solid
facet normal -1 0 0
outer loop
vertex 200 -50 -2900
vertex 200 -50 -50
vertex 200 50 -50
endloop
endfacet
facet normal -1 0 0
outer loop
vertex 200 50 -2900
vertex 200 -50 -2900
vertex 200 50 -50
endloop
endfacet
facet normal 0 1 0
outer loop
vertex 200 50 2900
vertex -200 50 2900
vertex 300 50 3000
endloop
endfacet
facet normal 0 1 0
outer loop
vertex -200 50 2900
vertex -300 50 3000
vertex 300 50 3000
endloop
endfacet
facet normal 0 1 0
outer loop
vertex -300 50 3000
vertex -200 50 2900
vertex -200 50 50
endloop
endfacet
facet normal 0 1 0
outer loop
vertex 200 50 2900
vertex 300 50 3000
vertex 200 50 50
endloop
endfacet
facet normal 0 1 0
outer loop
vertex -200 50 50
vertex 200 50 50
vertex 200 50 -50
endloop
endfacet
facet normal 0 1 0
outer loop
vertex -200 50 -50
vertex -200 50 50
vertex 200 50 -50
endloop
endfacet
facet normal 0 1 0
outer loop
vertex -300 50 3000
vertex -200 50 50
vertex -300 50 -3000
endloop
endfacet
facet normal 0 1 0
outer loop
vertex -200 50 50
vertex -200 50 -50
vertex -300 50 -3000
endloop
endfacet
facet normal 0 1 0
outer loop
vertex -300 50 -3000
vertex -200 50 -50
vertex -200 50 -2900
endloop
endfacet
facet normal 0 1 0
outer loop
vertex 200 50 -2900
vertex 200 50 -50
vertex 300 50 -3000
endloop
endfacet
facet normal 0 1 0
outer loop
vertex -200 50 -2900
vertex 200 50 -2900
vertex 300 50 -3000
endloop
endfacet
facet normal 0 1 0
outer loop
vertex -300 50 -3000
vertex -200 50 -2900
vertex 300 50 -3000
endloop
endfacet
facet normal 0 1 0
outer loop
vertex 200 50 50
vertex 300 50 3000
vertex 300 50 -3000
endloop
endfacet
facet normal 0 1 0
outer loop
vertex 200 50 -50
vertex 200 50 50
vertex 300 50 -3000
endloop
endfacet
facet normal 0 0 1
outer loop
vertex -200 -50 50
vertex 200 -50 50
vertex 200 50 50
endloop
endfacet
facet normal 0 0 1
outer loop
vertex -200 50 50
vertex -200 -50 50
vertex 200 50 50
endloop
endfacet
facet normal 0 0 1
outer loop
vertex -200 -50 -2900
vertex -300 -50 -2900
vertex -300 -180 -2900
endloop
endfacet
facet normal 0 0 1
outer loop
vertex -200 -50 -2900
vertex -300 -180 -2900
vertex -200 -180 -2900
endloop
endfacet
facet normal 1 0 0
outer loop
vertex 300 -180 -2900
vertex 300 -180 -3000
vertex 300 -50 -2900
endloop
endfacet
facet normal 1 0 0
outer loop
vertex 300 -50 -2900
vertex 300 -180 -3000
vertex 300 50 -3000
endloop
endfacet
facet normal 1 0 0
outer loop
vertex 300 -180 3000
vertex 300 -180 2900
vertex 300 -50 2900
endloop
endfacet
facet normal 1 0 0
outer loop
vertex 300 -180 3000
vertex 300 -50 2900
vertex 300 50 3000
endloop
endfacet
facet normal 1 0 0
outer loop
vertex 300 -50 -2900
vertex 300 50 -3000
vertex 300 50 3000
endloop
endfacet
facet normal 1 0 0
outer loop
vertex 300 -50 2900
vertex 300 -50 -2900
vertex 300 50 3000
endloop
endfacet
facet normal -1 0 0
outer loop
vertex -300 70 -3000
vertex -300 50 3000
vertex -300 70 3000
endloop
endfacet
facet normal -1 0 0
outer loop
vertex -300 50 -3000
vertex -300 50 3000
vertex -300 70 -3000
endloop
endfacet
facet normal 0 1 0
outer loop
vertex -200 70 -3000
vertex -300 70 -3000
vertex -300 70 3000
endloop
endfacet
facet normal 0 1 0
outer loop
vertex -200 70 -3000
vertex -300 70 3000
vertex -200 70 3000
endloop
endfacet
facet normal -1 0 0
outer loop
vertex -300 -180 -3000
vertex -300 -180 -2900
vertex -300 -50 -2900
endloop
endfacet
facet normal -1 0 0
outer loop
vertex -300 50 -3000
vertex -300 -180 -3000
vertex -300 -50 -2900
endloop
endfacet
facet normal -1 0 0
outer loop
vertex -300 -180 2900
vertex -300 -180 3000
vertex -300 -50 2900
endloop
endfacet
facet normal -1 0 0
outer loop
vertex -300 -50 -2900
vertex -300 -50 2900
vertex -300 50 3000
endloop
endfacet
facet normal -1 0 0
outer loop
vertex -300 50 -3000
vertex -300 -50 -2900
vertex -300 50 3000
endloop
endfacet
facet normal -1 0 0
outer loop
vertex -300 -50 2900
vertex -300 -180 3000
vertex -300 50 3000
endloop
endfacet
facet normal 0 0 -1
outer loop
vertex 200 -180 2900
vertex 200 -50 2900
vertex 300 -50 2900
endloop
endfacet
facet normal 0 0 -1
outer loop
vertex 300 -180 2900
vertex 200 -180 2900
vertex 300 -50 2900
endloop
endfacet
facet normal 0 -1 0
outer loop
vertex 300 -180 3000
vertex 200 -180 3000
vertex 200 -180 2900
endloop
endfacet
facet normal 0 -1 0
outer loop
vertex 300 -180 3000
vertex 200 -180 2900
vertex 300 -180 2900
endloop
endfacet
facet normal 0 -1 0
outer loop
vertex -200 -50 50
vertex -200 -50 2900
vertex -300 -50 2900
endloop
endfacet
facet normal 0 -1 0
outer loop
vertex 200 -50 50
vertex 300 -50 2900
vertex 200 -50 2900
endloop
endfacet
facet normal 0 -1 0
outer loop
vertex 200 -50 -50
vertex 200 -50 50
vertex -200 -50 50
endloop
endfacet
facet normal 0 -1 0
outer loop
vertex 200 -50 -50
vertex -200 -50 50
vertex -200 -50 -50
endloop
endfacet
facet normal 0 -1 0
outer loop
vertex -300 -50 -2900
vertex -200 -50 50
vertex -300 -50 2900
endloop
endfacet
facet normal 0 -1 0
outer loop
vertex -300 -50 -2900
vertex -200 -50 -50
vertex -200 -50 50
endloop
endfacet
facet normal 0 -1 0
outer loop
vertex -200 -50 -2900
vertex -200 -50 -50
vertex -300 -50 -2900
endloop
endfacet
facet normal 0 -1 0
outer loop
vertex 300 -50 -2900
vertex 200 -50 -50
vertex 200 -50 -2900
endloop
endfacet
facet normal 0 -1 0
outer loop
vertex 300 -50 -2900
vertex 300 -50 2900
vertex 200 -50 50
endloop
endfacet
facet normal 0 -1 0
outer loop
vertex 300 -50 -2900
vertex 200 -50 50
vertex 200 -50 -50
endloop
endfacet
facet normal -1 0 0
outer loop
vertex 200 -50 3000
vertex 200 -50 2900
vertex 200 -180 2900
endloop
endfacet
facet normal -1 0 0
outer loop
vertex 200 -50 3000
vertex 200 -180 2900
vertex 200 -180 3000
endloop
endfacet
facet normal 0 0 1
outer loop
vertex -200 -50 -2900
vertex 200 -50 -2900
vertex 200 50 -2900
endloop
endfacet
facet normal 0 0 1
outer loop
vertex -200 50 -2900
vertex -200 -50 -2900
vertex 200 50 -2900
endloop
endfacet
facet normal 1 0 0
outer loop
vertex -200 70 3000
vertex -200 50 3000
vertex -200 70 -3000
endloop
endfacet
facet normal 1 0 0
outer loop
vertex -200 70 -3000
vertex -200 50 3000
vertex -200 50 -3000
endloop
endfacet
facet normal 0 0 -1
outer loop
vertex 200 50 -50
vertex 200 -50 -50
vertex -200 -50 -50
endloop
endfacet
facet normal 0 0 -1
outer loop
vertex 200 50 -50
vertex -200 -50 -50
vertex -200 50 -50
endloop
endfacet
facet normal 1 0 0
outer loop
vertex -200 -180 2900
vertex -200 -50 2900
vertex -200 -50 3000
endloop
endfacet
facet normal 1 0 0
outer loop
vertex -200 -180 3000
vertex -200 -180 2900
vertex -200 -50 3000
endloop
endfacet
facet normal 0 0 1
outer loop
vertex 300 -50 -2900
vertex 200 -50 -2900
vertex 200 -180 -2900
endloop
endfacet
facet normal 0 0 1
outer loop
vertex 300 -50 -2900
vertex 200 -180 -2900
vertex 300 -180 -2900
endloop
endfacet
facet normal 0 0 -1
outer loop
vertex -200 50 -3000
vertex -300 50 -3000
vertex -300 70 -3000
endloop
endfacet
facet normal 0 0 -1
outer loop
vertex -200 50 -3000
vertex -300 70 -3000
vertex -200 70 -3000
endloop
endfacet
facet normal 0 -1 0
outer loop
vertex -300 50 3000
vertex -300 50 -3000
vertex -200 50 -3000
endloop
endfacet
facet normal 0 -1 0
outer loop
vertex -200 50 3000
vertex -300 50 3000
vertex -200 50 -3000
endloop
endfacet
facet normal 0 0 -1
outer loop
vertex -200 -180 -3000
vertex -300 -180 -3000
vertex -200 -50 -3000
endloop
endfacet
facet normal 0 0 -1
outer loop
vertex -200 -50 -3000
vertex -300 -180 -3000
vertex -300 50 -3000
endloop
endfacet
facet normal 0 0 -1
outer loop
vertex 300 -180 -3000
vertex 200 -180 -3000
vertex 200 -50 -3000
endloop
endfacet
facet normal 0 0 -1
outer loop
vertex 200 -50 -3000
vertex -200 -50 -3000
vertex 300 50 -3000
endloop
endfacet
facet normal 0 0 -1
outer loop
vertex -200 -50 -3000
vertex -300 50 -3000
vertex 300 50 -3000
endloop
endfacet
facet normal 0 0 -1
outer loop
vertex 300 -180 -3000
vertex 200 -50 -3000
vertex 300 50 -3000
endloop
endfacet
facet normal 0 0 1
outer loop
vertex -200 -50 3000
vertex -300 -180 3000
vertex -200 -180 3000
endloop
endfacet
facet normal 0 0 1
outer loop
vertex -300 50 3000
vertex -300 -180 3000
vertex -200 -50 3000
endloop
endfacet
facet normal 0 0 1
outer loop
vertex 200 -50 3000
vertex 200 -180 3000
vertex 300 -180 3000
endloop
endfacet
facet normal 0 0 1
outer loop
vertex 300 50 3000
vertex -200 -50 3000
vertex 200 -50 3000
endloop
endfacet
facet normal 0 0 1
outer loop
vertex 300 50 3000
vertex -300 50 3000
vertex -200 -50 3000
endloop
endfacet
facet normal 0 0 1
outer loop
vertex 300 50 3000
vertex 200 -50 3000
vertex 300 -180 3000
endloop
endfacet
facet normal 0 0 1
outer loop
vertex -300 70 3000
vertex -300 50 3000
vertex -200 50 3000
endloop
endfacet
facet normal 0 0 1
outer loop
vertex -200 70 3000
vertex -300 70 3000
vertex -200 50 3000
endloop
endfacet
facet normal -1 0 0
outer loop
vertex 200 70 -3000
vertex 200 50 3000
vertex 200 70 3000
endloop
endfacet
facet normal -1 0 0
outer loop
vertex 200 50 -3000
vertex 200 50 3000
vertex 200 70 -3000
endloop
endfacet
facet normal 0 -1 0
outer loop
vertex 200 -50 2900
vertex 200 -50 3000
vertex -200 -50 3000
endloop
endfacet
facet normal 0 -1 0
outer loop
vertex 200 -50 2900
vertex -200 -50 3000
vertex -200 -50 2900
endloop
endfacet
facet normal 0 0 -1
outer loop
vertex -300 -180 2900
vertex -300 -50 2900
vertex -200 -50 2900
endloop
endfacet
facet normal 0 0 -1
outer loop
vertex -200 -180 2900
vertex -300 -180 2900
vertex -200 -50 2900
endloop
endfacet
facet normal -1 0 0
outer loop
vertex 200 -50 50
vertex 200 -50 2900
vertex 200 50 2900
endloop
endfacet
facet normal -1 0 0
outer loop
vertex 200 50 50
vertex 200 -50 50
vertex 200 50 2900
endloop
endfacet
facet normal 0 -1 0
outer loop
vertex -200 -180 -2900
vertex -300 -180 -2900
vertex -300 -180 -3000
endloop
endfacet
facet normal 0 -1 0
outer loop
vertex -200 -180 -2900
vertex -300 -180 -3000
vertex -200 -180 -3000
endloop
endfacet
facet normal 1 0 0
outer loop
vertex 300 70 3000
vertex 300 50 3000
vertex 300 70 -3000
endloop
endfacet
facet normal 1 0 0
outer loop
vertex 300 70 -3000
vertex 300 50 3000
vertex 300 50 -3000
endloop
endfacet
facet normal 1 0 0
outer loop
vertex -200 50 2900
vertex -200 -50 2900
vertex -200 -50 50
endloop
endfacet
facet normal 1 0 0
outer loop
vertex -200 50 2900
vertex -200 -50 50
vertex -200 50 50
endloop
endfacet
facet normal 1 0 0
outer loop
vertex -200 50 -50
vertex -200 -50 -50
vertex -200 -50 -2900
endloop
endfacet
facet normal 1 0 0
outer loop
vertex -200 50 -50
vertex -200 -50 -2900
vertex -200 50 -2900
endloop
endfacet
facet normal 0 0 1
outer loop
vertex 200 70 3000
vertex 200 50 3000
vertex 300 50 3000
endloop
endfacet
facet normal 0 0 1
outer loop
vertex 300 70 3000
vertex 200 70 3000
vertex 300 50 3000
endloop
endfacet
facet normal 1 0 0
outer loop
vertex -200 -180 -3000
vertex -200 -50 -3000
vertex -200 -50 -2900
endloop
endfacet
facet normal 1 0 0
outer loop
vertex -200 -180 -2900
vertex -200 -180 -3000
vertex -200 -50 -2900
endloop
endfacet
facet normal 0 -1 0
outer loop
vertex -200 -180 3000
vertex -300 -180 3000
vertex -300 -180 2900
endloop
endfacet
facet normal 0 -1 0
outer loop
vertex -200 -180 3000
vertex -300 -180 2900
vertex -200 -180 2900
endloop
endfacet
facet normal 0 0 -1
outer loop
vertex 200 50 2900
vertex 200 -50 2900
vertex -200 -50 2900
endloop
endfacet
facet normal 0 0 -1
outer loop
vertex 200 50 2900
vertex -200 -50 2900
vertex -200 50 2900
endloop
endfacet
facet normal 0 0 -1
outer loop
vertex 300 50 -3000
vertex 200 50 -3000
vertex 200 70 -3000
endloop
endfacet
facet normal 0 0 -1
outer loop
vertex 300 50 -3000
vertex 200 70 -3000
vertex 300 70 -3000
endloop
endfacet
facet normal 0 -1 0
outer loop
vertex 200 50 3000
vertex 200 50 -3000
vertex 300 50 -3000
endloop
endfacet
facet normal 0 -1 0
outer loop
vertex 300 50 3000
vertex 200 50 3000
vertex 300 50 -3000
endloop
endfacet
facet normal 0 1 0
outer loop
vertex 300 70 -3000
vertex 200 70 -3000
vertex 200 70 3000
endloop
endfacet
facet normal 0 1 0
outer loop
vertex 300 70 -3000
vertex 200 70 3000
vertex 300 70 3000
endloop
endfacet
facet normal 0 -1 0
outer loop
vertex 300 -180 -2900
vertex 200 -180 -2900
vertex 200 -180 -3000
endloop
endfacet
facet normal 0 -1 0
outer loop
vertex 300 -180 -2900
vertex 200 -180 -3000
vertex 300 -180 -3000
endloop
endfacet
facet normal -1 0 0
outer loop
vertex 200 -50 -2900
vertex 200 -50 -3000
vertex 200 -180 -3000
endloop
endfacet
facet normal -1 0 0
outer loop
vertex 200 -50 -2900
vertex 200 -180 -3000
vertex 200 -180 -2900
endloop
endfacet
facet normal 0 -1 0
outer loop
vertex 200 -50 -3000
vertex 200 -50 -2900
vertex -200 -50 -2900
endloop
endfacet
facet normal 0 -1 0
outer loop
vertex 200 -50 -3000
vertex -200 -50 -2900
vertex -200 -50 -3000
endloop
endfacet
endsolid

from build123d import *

# Parameters (mm, degrees)
SKETCH_1_W        = 100
SKETCH_1_H        = 100
EXTRUDE_1_DEPTH   = 3000
EXTRUDE_1_2_DEPTH = 3000
SKETCH_2_W        = 100
SKETCH_2_H        = 100
EXTRUDE_2_DEPTH   = 500
SKETCH_3_W        = 100
SKETCH_3_H        = 100
EXTRUDE_3_DEPTH   = 130
SKETCH_4_W        = 100
SKETCH_4_H        = 6000
EXTRUDE_4_DEPTH   = 20
EXTRUDE_4_2_DEPTH = 20


with BuildPart() as part:
    # 草图1 → 凸台-拉伸1 (new, symmetric)
    with BuildSketch(Plane.XY):
        with Locations((-250, 0)):
            Rectangle(SKETCH_1_W, SKETCH_1_H)
    extrude(amount=EXTRUDE_1_DEPTH, both=True)



with BuildPart() as body_2:
    # 草图1 → Extrude 1 2 (new, symmetric)
    with BuildSketch(Plane.XY):
        with Locations((250, 0)):
            Rectangle(SKETCH_1_W, SKETCH_1_H)
    extrude(amount=EXTRUDE_1_2_DEPTH, both=True)


with BuildPart() as part_1:
    add(part.part)

    add(body_2.part)  # 凸台-拉伸2 merges body 2
    # 草图2 → 凸台-拉伸2 (add)
    with BuildSketch(Plane(origin=(300, 0, 0), x_dir=(0, 0, -1), z_dir=(1, 0, 0))):
        with Locations((-2950, 0)):
            Rectangle(SKETCH_2_W, SKETCH_2_H)
        with Locations((2950, 0)):
            Rectangle(SKETCH_2_W, SKETCH_2_H)
        Rectangle(SKETCH_2_W, SKETCH_2_H)
    extrude(amount=-EXTRUDE_2_DEPTH)

    # 草图3 → 凸台-拉伸3 (add)
    with BuildSketch(Plane.XZ.offset(50)):
        with Locations((250, 2950)):
            Rectangle(SKETCH_3_W, SKETCH_3_H)
        with Locations((-250, 2950)):
            Rectangle(SKETCH_3_W, SKETCH_3_H)
        with Locations((250, -2950)):
            Rectangle(SKETCH_3_W, SKETCH_3_H)
        with Locations((-250, -2950)):
            Rectangle(SKETCH_3_W, SKETCH_3_H)
    extrude(amount=EXTRUDE_3_DEPTH)


with BuildPart() as body_2_2:
    # 草图4 → 凸台-拉伸4 (new body)
    with BuildSketch(Plane(origin=(0, 50, 0), x_dir=(1, 0, 0), z_dir=(0, 1, 0))):
        with Locations((250, 0)):
            Rectangle(SKETCH_4_W, SKETCH_4_H)
    extrude(amount=EXTRUDE_4_DEPTH)


with BuildPart() as body_3:
    # 草图4 → Extrude 4 2 (new body)
    with BuildSketch(Plane(origin=(0, 50, 0), x_dir=(1, 0, 0), z_dir=(0, 1, 0))):
        with Locations((-250, 0)):
            Rectangle(SKETCH_4_W, SKETCH_4_H)
    extrude(amount=EXTRUDE_4_2_DEPTH)


solid = Compound([part_1.part, body_2_2.part, body_3.part])
